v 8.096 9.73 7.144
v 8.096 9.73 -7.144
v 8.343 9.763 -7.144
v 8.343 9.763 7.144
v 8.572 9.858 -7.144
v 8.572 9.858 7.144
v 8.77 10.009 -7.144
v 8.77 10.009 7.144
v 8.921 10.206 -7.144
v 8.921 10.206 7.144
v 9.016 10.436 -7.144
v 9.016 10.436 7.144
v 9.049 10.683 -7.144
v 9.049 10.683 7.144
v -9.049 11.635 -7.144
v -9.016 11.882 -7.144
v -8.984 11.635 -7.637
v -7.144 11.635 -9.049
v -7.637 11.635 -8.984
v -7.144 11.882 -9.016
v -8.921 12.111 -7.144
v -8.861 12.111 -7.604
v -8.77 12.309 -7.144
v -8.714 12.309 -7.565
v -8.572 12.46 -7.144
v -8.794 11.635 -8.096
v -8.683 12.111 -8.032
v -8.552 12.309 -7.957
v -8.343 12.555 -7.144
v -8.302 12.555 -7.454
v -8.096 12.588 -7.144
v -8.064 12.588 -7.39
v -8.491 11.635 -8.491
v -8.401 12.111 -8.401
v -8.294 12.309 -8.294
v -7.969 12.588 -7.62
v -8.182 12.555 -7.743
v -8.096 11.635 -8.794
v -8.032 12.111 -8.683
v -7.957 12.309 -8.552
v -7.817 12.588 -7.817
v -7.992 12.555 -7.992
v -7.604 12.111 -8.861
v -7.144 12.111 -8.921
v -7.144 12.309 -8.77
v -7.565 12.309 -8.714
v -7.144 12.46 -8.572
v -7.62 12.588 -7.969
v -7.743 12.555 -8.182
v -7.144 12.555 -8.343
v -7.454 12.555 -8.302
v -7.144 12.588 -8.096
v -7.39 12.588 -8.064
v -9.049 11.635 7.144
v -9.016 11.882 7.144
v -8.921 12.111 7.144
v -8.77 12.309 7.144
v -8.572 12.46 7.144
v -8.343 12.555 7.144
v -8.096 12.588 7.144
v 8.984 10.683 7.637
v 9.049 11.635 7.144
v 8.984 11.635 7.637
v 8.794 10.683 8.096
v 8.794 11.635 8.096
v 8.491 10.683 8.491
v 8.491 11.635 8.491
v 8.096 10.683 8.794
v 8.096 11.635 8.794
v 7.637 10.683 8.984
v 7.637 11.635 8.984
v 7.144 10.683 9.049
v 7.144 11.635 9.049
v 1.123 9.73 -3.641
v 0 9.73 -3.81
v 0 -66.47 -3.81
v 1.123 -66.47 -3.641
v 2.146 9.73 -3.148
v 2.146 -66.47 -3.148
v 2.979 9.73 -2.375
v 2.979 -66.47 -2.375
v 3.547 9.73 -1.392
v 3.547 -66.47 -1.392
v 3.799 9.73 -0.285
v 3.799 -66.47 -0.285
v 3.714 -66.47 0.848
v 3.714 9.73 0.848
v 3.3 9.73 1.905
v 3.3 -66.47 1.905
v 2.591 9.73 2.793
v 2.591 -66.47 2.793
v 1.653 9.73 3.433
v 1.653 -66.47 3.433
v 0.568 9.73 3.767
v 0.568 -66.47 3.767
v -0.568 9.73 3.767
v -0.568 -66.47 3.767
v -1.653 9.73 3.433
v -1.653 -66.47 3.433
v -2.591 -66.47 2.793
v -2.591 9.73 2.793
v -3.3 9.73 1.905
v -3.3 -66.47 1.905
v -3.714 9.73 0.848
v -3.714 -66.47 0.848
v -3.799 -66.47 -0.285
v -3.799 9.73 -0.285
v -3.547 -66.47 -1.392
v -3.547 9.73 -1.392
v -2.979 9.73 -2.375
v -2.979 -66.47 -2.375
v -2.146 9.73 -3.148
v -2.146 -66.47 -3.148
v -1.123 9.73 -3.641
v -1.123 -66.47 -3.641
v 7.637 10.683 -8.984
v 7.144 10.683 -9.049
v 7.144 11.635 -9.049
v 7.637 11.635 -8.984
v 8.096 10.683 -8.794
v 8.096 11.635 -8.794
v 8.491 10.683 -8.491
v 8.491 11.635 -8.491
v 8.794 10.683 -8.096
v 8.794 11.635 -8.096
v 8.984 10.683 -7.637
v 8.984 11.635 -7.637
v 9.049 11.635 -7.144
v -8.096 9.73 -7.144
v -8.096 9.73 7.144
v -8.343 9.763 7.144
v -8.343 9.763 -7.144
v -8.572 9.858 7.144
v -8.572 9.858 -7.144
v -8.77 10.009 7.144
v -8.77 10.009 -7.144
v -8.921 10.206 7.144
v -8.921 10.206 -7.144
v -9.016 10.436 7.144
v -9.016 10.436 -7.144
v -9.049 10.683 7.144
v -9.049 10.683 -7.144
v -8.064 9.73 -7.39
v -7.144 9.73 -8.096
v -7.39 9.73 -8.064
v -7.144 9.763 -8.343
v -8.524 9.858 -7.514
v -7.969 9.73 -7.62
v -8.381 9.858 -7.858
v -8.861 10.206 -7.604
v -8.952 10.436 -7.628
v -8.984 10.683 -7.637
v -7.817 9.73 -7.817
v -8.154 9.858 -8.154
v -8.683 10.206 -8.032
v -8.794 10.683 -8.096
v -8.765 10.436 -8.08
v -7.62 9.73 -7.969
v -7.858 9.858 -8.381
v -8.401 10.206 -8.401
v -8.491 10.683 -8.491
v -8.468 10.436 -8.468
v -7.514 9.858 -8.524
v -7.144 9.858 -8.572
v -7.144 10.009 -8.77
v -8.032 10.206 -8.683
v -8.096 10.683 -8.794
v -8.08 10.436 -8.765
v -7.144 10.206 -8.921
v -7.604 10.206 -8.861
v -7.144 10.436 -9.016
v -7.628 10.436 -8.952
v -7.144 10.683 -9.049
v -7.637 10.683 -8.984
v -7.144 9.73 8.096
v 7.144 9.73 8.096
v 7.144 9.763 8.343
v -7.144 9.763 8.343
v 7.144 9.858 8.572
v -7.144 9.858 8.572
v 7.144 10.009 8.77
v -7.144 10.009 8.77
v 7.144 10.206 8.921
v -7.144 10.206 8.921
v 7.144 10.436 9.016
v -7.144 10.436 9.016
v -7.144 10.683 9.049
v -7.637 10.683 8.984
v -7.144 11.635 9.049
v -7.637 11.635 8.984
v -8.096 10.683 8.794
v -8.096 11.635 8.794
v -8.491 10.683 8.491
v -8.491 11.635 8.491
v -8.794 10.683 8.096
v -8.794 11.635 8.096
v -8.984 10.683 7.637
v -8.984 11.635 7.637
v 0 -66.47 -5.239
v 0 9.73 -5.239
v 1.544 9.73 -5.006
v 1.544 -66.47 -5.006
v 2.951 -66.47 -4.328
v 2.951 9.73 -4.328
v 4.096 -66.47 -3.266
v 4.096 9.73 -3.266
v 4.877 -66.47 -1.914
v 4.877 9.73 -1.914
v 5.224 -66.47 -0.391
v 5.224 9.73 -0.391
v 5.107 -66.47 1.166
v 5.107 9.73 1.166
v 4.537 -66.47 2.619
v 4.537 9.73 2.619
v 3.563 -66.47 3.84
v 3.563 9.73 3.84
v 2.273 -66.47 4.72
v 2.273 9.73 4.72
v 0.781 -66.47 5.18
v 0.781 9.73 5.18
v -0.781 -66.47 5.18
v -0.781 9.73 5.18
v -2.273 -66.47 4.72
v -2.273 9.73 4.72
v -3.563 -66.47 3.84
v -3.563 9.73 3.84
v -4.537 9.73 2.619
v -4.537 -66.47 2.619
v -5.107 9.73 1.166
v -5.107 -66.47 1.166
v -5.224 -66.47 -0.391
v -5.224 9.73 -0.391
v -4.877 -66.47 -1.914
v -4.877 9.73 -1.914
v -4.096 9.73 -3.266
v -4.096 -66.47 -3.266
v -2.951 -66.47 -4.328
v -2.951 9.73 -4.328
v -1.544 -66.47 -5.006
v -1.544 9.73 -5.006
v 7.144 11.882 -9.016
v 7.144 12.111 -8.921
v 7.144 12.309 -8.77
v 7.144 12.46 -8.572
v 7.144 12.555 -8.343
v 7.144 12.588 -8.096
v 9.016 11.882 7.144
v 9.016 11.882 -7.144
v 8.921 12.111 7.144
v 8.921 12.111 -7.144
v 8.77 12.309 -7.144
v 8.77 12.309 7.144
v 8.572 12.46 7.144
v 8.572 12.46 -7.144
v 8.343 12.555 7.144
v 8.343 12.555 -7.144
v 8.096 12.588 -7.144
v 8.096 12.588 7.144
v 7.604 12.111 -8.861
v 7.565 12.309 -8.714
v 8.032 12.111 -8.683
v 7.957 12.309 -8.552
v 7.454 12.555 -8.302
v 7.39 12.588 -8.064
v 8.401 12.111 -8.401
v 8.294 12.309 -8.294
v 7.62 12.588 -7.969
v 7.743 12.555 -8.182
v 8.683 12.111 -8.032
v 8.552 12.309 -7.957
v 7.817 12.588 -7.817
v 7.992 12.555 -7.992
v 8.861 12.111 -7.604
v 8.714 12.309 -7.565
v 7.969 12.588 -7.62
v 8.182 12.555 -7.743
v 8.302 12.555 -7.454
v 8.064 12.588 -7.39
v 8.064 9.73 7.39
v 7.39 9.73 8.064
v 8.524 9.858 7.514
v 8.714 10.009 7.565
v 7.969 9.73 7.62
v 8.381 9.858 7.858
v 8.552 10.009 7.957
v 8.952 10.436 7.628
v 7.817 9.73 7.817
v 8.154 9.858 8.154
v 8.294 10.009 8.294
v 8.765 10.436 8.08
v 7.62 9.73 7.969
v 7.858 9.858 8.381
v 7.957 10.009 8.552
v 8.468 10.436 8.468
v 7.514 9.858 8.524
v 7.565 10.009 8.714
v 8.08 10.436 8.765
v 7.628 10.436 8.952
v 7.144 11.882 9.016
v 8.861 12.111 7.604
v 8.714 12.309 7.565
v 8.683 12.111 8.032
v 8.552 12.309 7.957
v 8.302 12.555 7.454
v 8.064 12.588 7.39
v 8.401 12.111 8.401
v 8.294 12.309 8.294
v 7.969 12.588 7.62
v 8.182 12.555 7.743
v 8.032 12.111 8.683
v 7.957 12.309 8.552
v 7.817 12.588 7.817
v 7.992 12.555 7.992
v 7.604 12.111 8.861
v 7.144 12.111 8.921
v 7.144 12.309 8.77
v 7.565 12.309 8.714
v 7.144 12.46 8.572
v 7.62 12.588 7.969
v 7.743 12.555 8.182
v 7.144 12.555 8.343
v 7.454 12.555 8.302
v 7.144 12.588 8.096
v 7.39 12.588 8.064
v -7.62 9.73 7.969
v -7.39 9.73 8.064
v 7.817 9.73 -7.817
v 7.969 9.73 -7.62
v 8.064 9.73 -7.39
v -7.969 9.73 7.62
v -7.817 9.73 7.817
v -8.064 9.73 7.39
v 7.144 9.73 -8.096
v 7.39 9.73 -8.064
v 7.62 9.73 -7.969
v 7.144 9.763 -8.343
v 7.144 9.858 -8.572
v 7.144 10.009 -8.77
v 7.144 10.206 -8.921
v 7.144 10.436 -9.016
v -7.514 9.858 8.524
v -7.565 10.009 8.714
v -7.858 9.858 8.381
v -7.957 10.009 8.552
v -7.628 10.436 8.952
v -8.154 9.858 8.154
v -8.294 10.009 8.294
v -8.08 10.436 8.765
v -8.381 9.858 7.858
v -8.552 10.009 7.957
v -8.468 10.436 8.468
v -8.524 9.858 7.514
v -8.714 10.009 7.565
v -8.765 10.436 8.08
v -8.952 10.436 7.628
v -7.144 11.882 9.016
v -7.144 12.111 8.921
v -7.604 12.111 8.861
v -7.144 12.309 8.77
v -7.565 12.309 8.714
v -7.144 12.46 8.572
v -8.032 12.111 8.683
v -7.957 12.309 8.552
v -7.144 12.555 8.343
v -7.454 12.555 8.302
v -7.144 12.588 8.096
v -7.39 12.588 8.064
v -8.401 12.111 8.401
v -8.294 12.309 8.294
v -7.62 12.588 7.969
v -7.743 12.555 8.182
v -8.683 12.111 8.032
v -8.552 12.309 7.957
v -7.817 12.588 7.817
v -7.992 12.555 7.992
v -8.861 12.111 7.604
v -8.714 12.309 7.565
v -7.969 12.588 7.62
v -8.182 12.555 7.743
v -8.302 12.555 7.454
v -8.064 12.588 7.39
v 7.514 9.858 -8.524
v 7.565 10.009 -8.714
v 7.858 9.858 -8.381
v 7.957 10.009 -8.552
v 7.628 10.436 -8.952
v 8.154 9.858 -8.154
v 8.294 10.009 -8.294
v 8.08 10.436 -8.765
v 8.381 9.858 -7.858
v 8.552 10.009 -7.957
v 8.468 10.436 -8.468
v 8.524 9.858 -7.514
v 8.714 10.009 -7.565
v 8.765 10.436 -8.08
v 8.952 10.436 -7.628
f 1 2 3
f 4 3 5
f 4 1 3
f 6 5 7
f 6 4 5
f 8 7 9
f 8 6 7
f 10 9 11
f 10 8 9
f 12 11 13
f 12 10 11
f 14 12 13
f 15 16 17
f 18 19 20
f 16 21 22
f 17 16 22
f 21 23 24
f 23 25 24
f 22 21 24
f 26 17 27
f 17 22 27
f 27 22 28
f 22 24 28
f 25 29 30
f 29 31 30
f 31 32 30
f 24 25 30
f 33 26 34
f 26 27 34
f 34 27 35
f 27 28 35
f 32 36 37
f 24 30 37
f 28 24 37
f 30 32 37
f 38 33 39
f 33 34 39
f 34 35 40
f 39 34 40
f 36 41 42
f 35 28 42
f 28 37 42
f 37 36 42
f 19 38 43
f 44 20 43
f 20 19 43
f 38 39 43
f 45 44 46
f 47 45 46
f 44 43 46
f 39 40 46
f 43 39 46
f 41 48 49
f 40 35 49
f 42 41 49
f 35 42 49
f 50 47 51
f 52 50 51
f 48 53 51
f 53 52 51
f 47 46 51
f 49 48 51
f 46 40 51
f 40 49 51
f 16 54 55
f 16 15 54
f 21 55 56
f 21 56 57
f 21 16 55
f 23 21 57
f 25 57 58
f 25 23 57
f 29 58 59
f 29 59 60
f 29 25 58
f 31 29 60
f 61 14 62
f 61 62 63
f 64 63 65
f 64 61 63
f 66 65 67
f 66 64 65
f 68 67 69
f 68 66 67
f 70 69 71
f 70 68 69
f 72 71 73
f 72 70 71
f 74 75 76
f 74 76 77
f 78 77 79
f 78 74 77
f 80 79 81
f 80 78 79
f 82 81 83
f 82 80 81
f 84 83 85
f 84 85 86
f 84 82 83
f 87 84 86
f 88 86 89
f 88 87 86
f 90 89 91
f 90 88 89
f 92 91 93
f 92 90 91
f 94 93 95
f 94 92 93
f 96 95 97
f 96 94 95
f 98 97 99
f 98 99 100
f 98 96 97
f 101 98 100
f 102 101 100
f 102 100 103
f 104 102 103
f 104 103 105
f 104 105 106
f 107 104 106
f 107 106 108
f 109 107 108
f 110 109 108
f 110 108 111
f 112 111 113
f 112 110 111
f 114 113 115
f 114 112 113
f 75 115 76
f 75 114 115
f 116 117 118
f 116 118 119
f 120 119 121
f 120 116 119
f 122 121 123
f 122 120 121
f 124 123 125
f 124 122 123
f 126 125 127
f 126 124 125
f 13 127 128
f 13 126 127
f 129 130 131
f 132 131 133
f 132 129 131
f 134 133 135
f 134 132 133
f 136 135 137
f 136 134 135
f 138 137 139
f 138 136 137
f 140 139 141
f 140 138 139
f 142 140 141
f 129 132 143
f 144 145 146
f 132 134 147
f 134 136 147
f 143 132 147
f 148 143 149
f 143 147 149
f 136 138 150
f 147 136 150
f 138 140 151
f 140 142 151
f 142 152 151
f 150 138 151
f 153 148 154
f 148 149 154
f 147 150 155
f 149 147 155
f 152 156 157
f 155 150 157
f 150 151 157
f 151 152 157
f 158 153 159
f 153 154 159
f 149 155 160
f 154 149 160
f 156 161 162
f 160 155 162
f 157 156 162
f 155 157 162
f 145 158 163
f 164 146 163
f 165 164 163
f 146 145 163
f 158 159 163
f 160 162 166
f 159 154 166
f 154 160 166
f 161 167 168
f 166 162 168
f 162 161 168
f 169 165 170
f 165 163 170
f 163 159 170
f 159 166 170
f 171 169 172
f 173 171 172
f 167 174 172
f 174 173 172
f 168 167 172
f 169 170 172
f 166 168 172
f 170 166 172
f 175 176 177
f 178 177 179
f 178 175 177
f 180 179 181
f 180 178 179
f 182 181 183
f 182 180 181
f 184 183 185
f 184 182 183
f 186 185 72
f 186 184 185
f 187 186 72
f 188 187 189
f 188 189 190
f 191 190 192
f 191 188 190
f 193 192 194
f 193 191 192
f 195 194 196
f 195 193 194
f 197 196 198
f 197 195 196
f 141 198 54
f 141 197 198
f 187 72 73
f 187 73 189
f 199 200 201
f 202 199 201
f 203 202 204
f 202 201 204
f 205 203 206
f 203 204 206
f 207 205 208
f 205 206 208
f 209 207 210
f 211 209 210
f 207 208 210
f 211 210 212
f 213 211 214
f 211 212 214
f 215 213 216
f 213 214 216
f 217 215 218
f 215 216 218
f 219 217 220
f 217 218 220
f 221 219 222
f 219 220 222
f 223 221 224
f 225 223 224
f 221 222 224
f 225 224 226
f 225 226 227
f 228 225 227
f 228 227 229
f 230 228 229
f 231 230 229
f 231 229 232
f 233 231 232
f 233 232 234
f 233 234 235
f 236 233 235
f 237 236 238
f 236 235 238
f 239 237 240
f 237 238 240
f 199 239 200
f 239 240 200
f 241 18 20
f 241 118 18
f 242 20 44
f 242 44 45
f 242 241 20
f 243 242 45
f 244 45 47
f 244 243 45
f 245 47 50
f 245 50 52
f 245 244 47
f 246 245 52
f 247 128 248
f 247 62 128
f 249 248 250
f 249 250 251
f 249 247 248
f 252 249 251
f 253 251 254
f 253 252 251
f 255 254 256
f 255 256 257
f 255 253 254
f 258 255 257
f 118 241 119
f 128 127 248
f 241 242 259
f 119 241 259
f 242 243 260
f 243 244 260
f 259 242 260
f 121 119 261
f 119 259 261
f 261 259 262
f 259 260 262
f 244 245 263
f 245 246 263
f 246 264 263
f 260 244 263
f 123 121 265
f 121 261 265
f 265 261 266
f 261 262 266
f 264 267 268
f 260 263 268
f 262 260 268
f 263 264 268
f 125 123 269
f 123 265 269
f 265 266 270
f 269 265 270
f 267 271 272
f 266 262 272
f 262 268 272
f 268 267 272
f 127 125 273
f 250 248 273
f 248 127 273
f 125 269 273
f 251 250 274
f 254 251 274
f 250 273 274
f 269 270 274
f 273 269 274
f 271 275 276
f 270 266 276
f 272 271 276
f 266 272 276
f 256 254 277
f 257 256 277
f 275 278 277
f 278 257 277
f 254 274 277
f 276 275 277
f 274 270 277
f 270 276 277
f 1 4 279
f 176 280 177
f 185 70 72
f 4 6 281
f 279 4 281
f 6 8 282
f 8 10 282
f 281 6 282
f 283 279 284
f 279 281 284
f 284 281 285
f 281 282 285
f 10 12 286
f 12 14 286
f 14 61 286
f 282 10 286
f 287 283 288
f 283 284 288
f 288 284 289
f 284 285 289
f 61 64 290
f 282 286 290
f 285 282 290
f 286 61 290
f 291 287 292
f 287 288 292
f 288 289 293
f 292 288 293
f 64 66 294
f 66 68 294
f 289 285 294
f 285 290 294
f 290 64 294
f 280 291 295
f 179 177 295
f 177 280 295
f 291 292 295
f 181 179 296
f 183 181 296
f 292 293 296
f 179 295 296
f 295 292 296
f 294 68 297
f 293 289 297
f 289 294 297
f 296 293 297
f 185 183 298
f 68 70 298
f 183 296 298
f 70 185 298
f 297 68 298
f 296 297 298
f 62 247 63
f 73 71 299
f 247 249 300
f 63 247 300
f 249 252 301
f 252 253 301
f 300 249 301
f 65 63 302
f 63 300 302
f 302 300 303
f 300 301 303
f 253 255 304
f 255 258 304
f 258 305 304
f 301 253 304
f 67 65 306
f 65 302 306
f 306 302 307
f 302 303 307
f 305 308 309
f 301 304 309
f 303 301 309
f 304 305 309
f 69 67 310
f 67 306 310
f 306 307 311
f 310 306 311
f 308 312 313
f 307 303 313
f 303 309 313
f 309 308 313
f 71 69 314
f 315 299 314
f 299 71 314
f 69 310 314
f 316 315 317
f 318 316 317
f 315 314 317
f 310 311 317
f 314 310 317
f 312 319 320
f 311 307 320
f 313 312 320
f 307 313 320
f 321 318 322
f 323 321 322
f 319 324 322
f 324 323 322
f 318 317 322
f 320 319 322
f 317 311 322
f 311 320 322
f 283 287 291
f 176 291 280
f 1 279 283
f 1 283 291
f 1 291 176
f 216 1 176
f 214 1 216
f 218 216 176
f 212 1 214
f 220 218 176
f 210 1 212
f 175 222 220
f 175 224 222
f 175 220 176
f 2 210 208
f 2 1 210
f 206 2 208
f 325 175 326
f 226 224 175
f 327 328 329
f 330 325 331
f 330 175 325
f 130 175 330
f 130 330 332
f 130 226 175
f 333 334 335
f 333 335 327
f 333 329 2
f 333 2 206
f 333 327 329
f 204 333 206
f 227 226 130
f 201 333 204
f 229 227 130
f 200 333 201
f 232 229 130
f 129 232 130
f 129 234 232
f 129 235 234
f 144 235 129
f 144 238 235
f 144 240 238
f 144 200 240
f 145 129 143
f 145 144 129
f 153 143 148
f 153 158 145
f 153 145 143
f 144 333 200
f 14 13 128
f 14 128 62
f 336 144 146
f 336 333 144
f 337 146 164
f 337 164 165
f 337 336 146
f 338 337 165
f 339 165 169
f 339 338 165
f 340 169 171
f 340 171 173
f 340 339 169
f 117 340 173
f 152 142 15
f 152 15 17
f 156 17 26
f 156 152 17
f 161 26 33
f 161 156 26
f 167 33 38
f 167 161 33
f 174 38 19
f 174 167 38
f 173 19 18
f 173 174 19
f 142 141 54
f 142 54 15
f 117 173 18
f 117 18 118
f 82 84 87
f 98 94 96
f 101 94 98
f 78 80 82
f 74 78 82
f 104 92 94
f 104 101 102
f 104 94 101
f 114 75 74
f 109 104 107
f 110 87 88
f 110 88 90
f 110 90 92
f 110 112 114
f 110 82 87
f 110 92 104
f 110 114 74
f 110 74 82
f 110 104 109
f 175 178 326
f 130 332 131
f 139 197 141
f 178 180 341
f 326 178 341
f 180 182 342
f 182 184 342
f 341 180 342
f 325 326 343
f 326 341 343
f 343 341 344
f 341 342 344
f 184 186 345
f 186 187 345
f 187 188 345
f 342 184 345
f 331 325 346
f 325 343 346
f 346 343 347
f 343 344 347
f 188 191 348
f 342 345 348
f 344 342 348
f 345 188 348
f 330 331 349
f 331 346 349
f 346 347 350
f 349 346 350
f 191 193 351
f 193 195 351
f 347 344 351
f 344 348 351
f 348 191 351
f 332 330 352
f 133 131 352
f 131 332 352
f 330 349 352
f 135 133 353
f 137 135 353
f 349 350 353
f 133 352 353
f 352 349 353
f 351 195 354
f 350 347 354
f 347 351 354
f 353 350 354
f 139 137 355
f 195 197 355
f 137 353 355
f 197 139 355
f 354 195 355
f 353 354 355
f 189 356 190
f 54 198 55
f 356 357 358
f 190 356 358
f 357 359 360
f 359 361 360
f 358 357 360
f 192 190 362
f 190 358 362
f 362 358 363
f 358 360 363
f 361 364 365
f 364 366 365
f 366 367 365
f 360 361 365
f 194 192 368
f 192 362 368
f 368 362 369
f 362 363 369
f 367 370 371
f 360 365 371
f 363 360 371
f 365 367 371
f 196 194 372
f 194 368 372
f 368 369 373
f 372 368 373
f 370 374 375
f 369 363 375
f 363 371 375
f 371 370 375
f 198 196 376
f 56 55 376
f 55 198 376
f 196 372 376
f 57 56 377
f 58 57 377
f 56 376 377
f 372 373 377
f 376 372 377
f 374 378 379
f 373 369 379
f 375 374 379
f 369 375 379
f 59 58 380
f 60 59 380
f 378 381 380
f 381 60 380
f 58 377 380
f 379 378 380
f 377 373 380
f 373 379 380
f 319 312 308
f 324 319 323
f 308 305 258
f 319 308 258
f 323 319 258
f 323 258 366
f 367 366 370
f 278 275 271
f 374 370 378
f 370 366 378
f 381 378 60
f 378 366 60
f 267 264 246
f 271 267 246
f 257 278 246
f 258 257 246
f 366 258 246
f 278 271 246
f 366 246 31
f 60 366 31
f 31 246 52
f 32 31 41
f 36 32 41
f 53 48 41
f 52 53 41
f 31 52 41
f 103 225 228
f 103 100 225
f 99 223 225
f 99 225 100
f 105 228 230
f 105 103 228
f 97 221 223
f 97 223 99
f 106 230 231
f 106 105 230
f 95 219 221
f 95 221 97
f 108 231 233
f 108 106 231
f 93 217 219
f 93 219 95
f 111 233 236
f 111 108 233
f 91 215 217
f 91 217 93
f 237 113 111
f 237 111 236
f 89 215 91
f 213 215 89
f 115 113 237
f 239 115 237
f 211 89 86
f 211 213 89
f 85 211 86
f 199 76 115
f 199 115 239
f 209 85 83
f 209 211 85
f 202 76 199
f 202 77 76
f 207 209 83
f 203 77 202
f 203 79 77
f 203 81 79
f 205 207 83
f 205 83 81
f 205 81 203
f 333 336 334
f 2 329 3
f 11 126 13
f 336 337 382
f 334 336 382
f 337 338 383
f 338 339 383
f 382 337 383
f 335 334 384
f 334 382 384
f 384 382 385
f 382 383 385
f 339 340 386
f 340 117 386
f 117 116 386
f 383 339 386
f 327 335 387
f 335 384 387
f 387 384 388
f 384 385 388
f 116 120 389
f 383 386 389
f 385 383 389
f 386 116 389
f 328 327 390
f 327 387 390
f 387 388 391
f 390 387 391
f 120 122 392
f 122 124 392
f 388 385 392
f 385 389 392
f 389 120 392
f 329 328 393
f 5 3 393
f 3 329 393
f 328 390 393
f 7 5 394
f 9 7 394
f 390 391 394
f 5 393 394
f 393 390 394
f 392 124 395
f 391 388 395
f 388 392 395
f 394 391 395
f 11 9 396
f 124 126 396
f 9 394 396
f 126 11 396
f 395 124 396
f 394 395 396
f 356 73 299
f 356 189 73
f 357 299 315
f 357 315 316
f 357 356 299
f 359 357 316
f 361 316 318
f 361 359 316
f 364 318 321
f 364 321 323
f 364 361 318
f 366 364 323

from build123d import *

# Parameters (mm, degrees)
BOSS_EXTRUDE1_DEPTH = 1.905
SKETCH2_R           = 3.4925
SKETCH2_R_2         = 2.54
BOSS_EXTRUDE2_DEPTH = 50.8
FILLET2_R           = 0.635
SCALE1_SCALE        = 1.5


with BuildPart() as part:
    # Sketch1 → Boss-Extrude1 (new body)
    with BuildSketch(Plane(origin=(0, 0, 0), x_dir=(1, 0, 0), z_dir=(0, 1, 0))):
        with BuildLine():
            Line((-6.0325, -4.7625), (-6.0325, 4.7625))
            ThreePointArc((-6.0325, 4.7625), (-5.660525612, 5.660525612), (-4.7625, 6.0325))
            Line((-4.7625, 6.0325), (4.7625, 6.0325))
            ThreePointArc((4.7625, 6.0325), (5.660525612, 5.660525612), (6.0325, 4.7625))
            Line((6.0325, 4.7625), (6.0325, -4.7625))
            ThreePointArc((6.0325, -4.7625), (5.660525612, -5.660525612), (4.7625, -6.0325))
            Line((4.7625, -6.0325), (-4.7625, -6.0325))
            ThreePointArc((-4.7625, -6.0325), (-5.660525612, -5.660525612), (-6.0325, -4.7625))
        make_face()
    extrude(amount=BOSS_EXTRUDE1_DEPTH)

    # Sketch2 → Boss-Extrude2 (add)
    with BuildSketch(Plane.XZ):
        with Locations(Location((0, 0, 0), (0, 0, 270))):
            Circle(SKETCH2_R)
        with Locations(Location((0, 0, 0), (0, 0, 270))):
            Circle(SKETCH2_R_2, mode=Mode.SUBTRACT)
    extrude(amount=BOSS_EXTRUDE2_DEPTH)

    # Fillet2
    fillet2_edges = [part.edges().sort_by_distance(p)[0] for p in [
        (-5.660525612, 1.905, -5.660525612),
        (0, 0, -6.0325),
        (5.660525612, 0, -5.660525612),
        (-6.0325, 1.905, 0),
        (-5.660525612, 1.905, 5.660525612),
        (0, 1.905, 6.0325),
        (5.660525612, 1.905, 5.660525612),
        (6.0325, 1.905, 0),
        (5.660525612, 1.905, -5.660525612),
        (0, 1.905, -6.0325),
        (6.0325, 0, 0),
        (5.660525612, 0, 5.660525612),
        (0, 0, 6.0325),
        (-5.660525612, 0, 5.660525612),
        (-6.0325, 0, 0),
        (-5.660525612, 0, -5.660525612),
    ]]
    fillet(fillet2_edges, radius=FILLET2_R)


with BuildPart() as part_1:
    # Scale1: scaled about (0, -19.460130845, 0)
    add(part.part.scale(SCALE1_SCALE).moved(Location((0, 9.730065422, 0))))


solid = part_1.part
